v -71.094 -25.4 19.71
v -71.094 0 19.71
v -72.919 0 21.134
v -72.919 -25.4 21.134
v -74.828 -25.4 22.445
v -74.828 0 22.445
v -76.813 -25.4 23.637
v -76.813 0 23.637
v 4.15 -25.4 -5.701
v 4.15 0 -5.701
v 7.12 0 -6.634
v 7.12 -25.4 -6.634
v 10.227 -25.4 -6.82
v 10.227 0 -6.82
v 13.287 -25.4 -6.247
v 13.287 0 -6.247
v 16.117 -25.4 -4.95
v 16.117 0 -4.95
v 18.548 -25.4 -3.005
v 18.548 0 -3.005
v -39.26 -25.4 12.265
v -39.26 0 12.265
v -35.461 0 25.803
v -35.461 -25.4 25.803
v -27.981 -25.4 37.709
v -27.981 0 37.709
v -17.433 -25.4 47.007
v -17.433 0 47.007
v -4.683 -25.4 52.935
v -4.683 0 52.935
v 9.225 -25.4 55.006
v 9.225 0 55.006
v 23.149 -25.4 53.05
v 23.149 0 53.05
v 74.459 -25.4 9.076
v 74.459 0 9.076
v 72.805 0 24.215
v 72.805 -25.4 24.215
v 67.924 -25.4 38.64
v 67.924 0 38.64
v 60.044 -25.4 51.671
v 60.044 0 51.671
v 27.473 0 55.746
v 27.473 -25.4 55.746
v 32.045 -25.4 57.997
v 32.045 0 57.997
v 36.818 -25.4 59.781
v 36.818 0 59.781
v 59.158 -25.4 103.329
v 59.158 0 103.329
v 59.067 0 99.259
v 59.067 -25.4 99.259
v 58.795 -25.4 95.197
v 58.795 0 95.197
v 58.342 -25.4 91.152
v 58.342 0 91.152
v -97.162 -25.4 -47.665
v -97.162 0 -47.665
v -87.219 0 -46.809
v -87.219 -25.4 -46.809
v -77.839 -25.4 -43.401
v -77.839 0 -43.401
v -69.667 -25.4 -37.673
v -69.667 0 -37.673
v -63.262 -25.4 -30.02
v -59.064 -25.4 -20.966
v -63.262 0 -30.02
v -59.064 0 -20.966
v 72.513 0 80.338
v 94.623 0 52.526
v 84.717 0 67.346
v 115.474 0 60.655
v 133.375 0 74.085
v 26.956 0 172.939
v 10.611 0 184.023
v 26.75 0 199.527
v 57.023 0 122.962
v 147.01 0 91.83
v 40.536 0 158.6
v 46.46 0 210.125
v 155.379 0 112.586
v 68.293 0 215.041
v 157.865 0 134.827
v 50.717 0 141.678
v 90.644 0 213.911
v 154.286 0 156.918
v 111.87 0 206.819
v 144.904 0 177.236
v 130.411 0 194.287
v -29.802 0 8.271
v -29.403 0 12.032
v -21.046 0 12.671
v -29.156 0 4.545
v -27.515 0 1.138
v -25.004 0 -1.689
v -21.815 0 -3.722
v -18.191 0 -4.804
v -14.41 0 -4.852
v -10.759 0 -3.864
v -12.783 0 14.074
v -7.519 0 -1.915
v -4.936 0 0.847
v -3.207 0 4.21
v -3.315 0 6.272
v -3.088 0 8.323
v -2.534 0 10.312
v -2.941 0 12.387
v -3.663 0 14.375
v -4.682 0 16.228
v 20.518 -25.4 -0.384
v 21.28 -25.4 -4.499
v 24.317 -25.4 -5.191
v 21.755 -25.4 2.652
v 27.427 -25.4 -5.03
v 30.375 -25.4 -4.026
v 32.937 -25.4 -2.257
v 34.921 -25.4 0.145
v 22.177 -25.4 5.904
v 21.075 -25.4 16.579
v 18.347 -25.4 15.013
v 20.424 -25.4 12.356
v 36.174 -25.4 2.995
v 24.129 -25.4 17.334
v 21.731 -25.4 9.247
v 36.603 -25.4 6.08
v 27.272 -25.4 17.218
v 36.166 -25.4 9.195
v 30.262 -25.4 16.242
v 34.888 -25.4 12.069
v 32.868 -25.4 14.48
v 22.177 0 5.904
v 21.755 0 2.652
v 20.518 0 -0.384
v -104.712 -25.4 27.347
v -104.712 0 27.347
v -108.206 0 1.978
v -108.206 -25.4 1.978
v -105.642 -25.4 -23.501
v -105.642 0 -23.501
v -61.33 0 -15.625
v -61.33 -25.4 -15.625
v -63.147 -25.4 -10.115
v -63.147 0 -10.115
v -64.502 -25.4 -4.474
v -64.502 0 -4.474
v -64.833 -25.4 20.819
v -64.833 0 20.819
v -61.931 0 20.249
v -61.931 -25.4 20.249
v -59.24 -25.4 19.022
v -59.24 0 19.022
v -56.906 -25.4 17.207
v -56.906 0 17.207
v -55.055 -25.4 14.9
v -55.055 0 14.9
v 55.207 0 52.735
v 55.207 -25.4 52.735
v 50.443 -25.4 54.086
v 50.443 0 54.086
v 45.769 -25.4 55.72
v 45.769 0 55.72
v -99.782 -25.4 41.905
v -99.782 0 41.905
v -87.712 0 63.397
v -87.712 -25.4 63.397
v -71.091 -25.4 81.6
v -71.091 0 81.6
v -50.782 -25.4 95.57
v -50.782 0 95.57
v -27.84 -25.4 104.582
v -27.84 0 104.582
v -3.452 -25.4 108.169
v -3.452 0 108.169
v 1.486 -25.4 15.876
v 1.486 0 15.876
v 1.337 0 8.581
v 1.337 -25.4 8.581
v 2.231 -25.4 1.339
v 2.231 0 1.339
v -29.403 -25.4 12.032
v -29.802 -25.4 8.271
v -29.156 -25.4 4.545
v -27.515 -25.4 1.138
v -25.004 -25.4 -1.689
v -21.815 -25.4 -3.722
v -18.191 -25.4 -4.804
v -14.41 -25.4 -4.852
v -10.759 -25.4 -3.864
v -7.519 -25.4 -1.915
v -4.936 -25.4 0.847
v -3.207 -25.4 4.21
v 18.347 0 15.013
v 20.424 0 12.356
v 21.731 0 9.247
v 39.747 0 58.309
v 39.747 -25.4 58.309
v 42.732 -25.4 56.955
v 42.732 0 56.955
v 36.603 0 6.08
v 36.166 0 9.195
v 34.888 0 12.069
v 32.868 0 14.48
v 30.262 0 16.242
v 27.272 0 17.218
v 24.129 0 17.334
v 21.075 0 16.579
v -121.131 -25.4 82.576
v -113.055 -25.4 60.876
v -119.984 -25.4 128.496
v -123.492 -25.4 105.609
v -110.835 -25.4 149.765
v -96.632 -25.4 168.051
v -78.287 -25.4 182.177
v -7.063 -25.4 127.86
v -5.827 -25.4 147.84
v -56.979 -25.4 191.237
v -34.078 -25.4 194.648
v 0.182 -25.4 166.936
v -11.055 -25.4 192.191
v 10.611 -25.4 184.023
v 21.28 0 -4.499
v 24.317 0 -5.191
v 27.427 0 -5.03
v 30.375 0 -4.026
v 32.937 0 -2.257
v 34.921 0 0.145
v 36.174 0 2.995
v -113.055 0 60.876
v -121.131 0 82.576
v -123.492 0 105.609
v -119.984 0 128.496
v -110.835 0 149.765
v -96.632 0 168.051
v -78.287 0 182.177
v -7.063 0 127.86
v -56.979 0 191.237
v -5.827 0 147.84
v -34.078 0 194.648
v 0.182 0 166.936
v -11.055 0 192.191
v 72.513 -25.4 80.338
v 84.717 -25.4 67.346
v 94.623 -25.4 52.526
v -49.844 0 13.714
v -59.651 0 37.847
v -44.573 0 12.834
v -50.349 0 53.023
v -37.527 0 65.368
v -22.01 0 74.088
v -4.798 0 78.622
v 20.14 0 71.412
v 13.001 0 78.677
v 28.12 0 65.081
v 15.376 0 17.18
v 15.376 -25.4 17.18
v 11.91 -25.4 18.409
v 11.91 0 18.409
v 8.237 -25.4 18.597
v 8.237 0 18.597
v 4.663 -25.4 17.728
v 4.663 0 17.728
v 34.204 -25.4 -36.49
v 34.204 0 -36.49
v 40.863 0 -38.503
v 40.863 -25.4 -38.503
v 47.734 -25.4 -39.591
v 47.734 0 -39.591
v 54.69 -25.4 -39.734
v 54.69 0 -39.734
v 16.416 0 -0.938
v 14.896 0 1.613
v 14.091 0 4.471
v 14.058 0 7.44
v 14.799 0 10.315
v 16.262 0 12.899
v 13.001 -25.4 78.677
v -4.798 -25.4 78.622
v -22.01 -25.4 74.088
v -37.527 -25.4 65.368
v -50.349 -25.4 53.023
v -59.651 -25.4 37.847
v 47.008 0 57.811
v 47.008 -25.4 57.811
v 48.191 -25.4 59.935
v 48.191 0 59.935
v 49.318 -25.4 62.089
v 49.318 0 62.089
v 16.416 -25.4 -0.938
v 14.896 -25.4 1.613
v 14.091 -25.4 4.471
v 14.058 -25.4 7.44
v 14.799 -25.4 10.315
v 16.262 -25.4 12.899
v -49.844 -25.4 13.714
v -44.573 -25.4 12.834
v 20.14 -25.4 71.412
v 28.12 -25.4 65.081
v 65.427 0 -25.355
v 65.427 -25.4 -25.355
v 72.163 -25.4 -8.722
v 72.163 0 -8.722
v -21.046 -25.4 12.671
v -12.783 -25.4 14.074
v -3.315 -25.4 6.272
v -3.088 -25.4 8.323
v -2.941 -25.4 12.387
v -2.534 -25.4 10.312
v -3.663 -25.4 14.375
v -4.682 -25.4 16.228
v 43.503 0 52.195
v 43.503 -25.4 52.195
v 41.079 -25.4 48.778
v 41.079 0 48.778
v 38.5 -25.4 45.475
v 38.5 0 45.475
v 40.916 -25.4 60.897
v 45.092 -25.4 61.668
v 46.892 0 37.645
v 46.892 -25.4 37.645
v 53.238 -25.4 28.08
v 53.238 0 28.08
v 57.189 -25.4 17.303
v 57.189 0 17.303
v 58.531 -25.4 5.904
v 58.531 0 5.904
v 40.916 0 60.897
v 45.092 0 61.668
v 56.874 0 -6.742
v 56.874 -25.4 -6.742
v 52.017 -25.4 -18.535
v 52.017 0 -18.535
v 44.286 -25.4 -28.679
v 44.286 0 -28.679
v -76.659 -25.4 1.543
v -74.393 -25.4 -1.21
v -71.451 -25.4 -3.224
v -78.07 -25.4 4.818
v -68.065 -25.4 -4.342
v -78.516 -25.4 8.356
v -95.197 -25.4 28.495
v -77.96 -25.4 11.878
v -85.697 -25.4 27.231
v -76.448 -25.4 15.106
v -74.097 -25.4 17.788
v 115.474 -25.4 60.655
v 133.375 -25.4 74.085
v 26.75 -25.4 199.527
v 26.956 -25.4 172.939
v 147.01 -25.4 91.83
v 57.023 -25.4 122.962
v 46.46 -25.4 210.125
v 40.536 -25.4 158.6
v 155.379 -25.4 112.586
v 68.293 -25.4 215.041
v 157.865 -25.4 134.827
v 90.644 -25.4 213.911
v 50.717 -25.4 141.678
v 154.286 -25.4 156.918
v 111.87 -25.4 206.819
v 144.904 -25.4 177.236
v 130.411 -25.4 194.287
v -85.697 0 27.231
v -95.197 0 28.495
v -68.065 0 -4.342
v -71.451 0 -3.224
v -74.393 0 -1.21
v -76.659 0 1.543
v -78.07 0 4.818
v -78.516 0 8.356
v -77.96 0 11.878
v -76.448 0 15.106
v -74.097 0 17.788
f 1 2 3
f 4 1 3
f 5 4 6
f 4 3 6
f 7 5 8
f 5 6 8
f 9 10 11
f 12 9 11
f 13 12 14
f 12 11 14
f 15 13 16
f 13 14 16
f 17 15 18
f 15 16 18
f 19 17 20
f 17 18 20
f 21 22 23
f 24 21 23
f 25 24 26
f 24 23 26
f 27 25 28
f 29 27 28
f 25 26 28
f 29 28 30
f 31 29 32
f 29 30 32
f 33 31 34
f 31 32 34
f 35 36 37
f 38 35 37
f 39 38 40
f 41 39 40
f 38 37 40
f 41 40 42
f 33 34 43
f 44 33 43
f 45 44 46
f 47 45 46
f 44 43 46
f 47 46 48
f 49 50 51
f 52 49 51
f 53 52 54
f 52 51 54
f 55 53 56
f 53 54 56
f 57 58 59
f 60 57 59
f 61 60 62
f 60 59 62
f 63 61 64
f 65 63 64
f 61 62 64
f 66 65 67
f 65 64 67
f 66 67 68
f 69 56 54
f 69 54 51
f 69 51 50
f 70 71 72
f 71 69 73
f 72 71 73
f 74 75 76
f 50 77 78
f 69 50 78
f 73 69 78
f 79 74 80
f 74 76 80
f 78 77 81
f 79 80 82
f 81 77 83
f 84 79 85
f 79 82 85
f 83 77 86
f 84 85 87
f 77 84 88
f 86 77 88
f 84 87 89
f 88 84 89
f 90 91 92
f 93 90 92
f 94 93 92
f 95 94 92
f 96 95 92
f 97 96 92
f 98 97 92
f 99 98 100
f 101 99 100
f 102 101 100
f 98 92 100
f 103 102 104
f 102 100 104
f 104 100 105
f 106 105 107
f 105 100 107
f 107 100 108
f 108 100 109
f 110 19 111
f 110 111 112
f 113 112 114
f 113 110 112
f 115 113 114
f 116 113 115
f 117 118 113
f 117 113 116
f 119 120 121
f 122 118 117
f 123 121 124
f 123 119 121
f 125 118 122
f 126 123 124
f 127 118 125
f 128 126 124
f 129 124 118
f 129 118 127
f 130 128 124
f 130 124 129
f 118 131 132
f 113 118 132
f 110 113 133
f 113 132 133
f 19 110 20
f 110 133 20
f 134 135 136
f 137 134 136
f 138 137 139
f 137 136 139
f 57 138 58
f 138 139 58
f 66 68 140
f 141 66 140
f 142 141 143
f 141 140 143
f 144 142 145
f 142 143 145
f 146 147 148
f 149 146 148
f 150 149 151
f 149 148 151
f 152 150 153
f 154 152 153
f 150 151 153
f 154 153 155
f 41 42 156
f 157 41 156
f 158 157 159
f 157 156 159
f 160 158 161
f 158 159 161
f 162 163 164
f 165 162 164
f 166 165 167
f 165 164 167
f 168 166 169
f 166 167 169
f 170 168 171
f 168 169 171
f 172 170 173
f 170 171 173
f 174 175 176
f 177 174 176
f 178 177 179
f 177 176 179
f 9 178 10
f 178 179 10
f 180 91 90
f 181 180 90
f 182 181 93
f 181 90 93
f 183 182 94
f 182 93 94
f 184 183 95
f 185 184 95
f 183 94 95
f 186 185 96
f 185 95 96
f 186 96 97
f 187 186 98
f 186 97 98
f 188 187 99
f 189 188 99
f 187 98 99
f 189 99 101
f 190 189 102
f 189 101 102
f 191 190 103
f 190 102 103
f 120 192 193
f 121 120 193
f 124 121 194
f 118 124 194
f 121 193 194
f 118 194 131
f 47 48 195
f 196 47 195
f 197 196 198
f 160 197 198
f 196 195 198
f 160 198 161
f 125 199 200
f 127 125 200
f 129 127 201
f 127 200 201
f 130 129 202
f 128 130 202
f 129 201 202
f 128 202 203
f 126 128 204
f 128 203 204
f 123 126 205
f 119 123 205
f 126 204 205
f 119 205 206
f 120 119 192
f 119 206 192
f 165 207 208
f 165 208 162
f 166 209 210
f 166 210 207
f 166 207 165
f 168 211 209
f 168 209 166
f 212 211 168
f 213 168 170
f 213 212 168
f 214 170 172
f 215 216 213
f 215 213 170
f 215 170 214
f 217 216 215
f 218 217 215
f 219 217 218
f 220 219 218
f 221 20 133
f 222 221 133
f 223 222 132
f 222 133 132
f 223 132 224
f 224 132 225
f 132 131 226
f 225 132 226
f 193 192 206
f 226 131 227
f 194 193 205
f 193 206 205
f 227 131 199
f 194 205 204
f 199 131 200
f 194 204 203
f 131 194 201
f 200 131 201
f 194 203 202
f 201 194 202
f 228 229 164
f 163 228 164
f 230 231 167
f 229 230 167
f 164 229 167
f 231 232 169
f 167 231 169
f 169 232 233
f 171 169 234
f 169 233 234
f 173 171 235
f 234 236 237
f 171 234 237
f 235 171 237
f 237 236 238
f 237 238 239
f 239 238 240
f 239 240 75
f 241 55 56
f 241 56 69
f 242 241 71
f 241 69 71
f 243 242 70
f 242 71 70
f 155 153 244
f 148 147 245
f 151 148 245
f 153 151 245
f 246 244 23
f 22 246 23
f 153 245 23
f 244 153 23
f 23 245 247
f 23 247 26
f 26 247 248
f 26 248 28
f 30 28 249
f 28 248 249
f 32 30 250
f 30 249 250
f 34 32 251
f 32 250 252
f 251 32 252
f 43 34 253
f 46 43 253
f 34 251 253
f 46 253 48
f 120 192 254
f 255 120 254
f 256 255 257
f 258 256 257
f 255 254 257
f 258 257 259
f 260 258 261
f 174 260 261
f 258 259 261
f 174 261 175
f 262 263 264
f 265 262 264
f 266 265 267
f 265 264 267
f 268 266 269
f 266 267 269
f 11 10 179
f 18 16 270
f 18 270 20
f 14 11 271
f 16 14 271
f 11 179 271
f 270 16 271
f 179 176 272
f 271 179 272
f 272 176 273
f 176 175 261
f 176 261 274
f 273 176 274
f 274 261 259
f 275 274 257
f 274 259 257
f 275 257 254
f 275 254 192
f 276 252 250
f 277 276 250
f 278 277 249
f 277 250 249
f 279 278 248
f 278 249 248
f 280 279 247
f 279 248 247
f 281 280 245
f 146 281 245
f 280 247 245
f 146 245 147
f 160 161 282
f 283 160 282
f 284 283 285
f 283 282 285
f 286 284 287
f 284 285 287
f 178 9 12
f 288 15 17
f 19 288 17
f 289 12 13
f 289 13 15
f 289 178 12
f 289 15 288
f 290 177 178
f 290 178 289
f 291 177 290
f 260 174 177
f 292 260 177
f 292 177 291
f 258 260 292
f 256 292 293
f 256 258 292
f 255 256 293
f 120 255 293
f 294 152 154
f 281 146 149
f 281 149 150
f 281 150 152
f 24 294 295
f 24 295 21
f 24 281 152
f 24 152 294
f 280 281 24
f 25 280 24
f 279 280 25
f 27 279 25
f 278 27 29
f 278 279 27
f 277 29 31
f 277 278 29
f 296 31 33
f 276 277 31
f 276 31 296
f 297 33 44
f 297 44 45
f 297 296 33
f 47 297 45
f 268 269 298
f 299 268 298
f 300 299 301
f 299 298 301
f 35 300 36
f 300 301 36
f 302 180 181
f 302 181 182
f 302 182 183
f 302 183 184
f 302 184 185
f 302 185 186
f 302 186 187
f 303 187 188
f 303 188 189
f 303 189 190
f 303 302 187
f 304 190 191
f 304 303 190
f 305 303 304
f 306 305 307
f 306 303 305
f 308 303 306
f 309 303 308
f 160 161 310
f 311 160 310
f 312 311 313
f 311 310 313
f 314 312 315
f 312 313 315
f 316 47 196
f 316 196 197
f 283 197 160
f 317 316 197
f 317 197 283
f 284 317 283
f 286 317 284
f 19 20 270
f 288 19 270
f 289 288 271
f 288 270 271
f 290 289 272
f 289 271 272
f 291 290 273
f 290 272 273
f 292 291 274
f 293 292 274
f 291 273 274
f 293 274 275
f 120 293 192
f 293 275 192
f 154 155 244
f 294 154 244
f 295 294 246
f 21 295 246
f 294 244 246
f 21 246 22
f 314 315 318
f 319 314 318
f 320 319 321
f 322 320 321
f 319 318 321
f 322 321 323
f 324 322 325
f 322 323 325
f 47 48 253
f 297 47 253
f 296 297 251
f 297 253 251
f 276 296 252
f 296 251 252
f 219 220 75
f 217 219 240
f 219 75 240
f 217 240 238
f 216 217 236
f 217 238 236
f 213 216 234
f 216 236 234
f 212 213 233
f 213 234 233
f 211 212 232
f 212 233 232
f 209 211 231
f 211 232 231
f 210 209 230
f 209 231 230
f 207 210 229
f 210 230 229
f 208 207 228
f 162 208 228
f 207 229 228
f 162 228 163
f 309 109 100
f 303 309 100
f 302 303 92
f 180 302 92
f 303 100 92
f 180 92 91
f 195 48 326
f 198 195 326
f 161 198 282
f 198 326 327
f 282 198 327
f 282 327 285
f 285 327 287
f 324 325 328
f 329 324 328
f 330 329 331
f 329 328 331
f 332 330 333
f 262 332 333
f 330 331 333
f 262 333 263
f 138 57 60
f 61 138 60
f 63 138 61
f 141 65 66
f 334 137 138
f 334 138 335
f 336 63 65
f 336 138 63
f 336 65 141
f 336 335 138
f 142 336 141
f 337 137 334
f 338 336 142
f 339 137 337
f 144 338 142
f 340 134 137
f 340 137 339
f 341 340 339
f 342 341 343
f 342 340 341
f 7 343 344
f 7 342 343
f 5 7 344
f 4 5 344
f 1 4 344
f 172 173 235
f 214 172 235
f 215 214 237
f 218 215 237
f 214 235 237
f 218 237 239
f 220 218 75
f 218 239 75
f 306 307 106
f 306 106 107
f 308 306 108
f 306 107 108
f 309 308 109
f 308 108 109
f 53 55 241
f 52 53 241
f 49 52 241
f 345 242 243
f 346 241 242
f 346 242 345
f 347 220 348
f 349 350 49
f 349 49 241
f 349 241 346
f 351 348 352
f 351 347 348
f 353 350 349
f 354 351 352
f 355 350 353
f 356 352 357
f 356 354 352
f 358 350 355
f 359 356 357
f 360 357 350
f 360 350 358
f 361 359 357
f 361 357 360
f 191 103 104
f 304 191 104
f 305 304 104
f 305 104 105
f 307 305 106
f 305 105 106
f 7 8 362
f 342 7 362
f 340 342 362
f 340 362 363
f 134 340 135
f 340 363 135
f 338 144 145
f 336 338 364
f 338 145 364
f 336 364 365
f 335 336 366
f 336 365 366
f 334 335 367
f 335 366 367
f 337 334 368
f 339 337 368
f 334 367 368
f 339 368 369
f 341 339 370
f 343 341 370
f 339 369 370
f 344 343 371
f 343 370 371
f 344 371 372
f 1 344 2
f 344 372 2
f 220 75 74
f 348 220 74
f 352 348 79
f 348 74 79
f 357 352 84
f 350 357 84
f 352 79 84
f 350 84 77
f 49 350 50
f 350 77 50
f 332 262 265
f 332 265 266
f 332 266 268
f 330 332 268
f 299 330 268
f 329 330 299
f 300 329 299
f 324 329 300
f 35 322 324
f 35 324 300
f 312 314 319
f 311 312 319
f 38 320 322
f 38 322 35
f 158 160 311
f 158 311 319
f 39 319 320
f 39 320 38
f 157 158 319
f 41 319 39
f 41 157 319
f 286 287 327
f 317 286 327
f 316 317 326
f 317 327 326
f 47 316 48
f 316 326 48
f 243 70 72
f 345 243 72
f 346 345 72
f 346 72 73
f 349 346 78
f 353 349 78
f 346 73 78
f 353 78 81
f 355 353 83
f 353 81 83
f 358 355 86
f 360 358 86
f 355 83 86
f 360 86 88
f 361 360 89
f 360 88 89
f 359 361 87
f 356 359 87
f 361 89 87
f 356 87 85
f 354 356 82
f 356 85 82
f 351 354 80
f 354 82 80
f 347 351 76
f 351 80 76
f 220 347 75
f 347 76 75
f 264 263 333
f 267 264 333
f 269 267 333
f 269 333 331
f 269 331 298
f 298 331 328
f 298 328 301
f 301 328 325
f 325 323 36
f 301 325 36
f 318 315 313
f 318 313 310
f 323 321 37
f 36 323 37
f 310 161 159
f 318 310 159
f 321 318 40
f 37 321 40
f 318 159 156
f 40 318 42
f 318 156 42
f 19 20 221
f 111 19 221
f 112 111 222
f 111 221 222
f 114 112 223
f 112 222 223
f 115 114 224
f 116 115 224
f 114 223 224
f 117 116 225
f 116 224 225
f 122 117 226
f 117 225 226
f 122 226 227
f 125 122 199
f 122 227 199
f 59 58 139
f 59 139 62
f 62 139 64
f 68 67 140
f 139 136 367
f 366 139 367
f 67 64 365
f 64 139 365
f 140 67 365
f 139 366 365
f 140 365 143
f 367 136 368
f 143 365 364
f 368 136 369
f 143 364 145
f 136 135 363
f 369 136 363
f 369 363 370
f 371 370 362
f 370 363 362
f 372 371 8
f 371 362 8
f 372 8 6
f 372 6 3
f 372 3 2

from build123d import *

# Parameters (mm, degrees)
F1_DEPTH = 25.4


with BuildPart() as f1:
    # F0 (on Front) → F1 (new body)
    with BuildSketch(Plane.XZ):
        with BuildLine():
            ThreePointArc((-99.7820331485, 41.9046056954), (-61.3357957407, 89.1648488956), (-3.4524105865, 108.1689926868))
            ThreePointArc((-3.4524105865, 108.1689926868), (-5.8270215594, 147.8401143177), (10.6108733792, 184.0234292394))
            ThreePointArc((10.6108733792, 184.0234292394), (-104.3151403106, 159.3598404599), (-99.7820331485, 41.9046056954))
        make_face()
    extrude(amount=F1_DEPTH)


with BuildPart() as f1b:
    # F0 (on Front) → F1, piece 2 (new body)
    with BuildSketch(Plane.XZ):
        with BuildLine():
            ThreePointArc((58.3423888694, 91.1516087556), (78.8833773673, 74.0936089879), (94.6229318461, 52.5257164309))
            ThreePointArc((94.6229318461, 52.5257164309), (140.1716079168, 81.6906460034), (157.8898090601, 132.7919214964))
            ThreePointArc((157.8898090601, 132.7919214964), (102.4611001387, 210.7594664765), (10.6108733792, 184.0234292394))
            ThreePointArc((10.6108733792, 184.0234292394), (46.0856017069, 150.4148967438), (59.157740084, 103.3287097598))
            ThreePointArc((59.157740084, 103.3287097598), (58.9536743226, 97.2265260017), (58.3423888694, 91.1516087556))
        make_face()
    extrude(amount=F1_DEPTH)


with BuildPart() as f1c:
    # F0 (on Front) → F1, piece 3 (new body)
    with BuildSketch(Plane.XZ):
        with BuildLine():
            ThreePointArc((74.4586447254, 9.0760244057), (70.7572303544, 31.5602585606), (60.0436427222, 51.6714567827))
            ThreePointArc((60.0436427222, 51.6714567827), (52.8151344484, 53.3744074731), (45.7689236688, 55.7201028))
            ThreePointArc((45.7689236688, 55.7201028), (42.3105782073, 50.4725272902), (38.4995673568, 45.4751881623))
            ThreePointArc((38.4995673568, 45.4751881623), (53.2375817136, 28.0800292912), (58.5306360879, 5.9038214386))
            ThreePointArc((58.5306360879, 5.9038214386), (52.0167979168, -18.5350150987), (34.2035211398, -36.489791329))
            ThreePointArc((34.2035211398, -36.489791329), (44.2800816804, -39.1645323798), (54.690052746, -39.7335793301))
            ThreePointArc((54.690052746, -39.7335793301), (69.3289164232, -17.2544458033), (74.4586447254, 9.0760244057))
        make_face()
    extrude(amount=F1_DEPTH)


with BuildPart() as f1d:
    # F0 (on Front) → F1, piece 4 (new body)
    with BuildSketch(Plane.XZ):
        with BuildLine():
            ThreePointArc((-29.403315449, 12.0320480209), (-20.0403946845, -4.3883703228), (-3.2071519288, 4.2102552739))
            ThreePointArc((-3.2071519288, 4.2102552739), (-3.2432298935, 7.3020803493), (-2.5338943744, 10.3116529165))
            ThreePointArc((-2.5338943744, 10.3116529165), (-3.263418859, 13.3947948144), (-4.6824373408, 16.2275243257))
            ThreePointArc((-4.6824373408, 16.2275243257), (-16.8982240165, 13.2774553399), (-29.403315449, 12.0320480209))
        make_face()
    extrude(amount=F1_DEPTH)


with BuildPart() as f1e:
    # F0 (on Front) → F1, piece 5 (new body)
    with BuildSketch(Plane.XZ):
        with BuildLine():
            ThreePointArc((36.8183977077, 59.7809403537), (24.032289088, 68.1232204556), (13.0010649902, 78.6773810494))
            ThreePointArc((13.0010649902, 78.6773810494), (-37.5267993685, 65.3679912413), (-64.8331324057, 20.8194883509))
            ThreePointArc((-64.8331324057, 20.8194883509), (-59.2404407457, 19.0221235644), (-55.0548746869, 14.9002602786))
            ThreePointArc((-55.0548746869, 14.9002602786), (-47.2152724966, 13.2355759025), (-39.2599239536, 12.2645114688))
            ThreePointArc((-39.2599239536, 12.2645114688), (-17.4331654783, 47.0070044847), (23.1492253152, 53.0499974504))
            ThreePointArc((23.1492253152, 53.0499974504), (29.7309432803, 56.9289927119), (36.8183977077, 59.7809403537))
        make_face()
    extrude(amount=F1_DEPTH)


with BuildPart() as f1f:
    # F0 (on Front) → F1, piece 6 (new body)
    with BuildSketch(Plane.XZ):
        with BuildLine():
            ThreePointArc((-104.7118213733, 27.3474785386), (-107.6800642713, -10.8376139555), (-97.1620467852, -47.6653624998))
            ThreePointArc((-97.1620467852, -47.6653624998), (-73.5647417971, -40.8057155829), (-59.0638345717, -20.9660772756))
            ThreePointArc((-59.0638345717, -20.9660772756), (-62.2952432462, -12.8890037347), (-64.5019363793, -4.4740394196))
            ThreePointArc((-64.5019363793, -4.4740394196), (-78.0701796096, 4.8178640714), (-71.0937063768, 19.7096576529))
            ThreePointArc((-71.0937063768, 19.7096576529), (-73.8638652855, 21.8037522882), (-76.8131849715, 23.6369260691))
            ThreePointArc((-76.8131849715, 23.6369260691), (-90.4073248826, 28.1626914149), (-104.7118213733, 27.3474785386))
        make_face()
    extrude(amount=F1_DEPTH)


with BuildPart() as f1g:
    # F0 (on Front) → F1, piece 7 (new body)
    with BuildSketch(Plane.XZ):
        with BuildLine():
            ThreePointArc((1.486309893, 15.8762545912), (1.6546949988, 4.9440931272), (4.1501411522, -5.7007768258))
            ThreePointArc((4.1501411522, -5.7007768258), (11.7747214788, -6.6270572768), (18.5476981544, -3.0050402169))
            ThreePointArc((18.5476981544, -3.0050402169), (13.9768972457, 5.9543593183), (18.3474962622, 15.0131078641))
            ThreePointArc((18.3474962622, 15.0131078641), (10.0802599781, 18.6357854253), (1.486309893, 15.8762545912))
        make_face()
    extrude(amount=F1_DEPTH)


with BuildPart() as f1h:
    # F0 (on Front) → F1, piece 8 (new body)
    with BuildSketch(Plane.XZ):
        with BuildLine():
            ThreePointArc((22.1771291455, 5.9038214386), (21.2349563131, 1.0939205738), (18.5476981544, -3.0050402169))
            ThreePointArc((18.5476981544, -3.0050402169), (30.374720524, -4.0259609568), (36.6028162094, 6.0800551437))
            ThreePointArc((36.6028162094, 6.0800551437), (30.2621243748, 16.2419464204), (18.3474962622, 15.0131078641))
            ThreePointArc((18.3474962622, 15.0131078641), (21.1807874746, 10.8446004056), (22.1771291455, 5.9038214386))
        make_face()
    extrude(amount=F1_DEPTH)


with BuildPart() as f1i:
    # F0 (on Front) → F1, piece 9 (new body)
    with BuildSketch(Plane.XZ):
        with BuildLine():
            ThreePointArc((45.7689236688, 55.7201028), (47.6069162219, 58.8690893402), (49.3177656338, 62.0889227436))
            ThreePointArc((49.3177656338, 62.0889227436), (42.9958736904, 61.3259891744), (36.8183977077, 59.7809403537))
            ThreePointArc((36.8183977077, 59.7809403537), (41.2331701262, 57.6171938239), (45.7689236688, 55.7201028))
        make_face()
    extrude(amount=F1_DEPTH)


solid = Compound([f1.part, f1b.part, f1c.part, f1d.part, f1e.part, f1f.part, f1g.part, f1h.part, f1i.part])
